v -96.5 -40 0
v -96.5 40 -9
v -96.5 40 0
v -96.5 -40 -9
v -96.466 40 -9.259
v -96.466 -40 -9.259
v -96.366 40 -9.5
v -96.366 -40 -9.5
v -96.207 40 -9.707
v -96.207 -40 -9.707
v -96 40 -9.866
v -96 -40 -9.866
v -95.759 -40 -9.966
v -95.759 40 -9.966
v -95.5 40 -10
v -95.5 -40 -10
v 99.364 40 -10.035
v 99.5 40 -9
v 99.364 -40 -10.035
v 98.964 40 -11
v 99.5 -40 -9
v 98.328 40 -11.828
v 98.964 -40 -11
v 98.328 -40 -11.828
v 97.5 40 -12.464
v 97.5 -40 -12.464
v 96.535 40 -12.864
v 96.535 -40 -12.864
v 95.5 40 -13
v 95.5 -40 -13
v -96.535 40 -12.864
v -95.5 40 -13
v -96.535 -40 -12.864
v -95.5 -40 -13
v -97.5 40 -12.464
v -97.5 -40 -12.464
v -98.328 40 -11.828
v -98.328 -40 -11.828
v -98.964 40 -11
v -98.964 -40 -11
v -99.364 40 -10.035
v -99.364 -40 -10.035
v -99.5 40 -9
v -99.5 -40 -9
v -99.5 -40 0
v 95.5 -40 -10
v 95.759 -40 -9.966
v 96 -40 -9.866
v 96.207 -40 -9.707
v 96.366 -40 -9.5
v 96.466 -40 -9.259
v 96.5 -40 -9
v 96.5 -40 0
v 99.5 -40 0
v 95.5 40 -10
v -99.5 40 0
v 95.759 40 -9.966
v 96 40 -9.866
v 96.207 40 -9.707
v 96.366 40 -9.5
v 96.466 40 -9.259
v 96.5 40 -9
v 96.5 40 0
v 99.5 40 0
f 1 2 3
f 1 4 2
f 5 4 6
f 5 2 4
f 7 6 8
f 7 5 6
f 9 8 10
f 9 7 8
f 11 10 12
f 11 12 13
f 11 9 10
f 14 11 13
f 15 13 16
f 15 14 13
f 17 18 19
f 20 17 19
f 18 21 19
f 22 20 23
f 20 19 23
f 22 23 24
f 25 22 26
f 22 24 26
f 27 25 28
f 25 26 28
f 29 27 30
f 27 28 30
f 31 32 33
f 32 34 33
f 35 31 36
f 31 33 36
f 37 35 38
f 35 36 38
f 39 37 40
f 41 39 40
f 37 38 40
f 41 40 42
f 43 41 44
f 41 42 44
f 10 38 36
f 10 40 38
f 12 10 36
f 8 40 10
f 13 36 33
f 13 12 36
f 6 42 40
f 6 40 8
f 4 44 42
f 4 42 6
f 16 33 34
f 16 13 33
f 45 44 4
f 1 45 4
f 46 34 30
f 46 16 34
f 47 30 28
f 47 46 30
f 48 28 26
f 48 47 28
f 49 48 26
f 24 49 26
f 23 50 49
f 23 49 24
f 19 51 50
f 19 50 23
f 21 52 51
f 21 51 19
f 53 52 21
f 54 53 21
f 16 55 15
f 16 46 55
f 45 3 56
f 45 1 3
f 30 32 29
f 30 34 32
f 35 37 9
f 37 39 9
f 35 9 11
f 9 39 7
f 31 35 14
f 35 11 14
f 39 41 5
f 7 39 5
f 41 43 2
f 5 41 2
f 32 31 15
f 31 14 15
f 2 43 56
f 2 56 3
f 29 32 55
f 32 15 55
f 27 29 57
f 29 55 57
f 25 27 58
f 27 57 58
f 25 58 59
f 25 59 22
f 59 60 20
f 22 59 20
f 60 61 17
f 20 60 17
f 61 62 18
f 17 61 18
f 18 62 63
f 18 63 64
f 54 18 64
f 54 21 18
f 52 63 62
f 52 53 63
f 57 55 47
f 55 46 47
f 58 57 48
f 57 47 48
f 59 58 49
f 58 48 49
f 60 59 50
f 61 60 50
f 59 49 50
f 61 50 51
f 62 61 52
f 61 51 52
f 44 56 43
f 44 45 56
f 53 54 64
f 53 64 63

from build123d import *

# Parameters (mm, degrees)
F1_DEPTH = 40
F2_R     = 1
F3_R     = 4


with BuildPart() as f1:
    # F0 (on Front) → F1 (new body, symmetric)
    with BuildSketch(Plane.XZ):
        Polygon((-99.5, 0), (-99.5, -13), (99.5, -13), (99.5, 0), (96.5, 0), (96.5, -10), (-96.5, -10), (-96.5, 0), align=None)
    extrude(amount=F1_DEPTH, both=True)

    # F2
    f2_edges = [f1.edges().sort_by_distance(p)[0] for p in [
        (-96.5, 0, -10),
        (96.5, 0, -10),
    ]]
    fillet(f2_edges, radius=F2_R)

    # F3
    f3_edges = [f1.edges().sort_by_distance(p)[0] for p in [
        (-99.5, 0, -13),
        (99.5, 0, -13),
    ]]
    fillet(f3_edges, radius=F3_R)


solid = f1.part
